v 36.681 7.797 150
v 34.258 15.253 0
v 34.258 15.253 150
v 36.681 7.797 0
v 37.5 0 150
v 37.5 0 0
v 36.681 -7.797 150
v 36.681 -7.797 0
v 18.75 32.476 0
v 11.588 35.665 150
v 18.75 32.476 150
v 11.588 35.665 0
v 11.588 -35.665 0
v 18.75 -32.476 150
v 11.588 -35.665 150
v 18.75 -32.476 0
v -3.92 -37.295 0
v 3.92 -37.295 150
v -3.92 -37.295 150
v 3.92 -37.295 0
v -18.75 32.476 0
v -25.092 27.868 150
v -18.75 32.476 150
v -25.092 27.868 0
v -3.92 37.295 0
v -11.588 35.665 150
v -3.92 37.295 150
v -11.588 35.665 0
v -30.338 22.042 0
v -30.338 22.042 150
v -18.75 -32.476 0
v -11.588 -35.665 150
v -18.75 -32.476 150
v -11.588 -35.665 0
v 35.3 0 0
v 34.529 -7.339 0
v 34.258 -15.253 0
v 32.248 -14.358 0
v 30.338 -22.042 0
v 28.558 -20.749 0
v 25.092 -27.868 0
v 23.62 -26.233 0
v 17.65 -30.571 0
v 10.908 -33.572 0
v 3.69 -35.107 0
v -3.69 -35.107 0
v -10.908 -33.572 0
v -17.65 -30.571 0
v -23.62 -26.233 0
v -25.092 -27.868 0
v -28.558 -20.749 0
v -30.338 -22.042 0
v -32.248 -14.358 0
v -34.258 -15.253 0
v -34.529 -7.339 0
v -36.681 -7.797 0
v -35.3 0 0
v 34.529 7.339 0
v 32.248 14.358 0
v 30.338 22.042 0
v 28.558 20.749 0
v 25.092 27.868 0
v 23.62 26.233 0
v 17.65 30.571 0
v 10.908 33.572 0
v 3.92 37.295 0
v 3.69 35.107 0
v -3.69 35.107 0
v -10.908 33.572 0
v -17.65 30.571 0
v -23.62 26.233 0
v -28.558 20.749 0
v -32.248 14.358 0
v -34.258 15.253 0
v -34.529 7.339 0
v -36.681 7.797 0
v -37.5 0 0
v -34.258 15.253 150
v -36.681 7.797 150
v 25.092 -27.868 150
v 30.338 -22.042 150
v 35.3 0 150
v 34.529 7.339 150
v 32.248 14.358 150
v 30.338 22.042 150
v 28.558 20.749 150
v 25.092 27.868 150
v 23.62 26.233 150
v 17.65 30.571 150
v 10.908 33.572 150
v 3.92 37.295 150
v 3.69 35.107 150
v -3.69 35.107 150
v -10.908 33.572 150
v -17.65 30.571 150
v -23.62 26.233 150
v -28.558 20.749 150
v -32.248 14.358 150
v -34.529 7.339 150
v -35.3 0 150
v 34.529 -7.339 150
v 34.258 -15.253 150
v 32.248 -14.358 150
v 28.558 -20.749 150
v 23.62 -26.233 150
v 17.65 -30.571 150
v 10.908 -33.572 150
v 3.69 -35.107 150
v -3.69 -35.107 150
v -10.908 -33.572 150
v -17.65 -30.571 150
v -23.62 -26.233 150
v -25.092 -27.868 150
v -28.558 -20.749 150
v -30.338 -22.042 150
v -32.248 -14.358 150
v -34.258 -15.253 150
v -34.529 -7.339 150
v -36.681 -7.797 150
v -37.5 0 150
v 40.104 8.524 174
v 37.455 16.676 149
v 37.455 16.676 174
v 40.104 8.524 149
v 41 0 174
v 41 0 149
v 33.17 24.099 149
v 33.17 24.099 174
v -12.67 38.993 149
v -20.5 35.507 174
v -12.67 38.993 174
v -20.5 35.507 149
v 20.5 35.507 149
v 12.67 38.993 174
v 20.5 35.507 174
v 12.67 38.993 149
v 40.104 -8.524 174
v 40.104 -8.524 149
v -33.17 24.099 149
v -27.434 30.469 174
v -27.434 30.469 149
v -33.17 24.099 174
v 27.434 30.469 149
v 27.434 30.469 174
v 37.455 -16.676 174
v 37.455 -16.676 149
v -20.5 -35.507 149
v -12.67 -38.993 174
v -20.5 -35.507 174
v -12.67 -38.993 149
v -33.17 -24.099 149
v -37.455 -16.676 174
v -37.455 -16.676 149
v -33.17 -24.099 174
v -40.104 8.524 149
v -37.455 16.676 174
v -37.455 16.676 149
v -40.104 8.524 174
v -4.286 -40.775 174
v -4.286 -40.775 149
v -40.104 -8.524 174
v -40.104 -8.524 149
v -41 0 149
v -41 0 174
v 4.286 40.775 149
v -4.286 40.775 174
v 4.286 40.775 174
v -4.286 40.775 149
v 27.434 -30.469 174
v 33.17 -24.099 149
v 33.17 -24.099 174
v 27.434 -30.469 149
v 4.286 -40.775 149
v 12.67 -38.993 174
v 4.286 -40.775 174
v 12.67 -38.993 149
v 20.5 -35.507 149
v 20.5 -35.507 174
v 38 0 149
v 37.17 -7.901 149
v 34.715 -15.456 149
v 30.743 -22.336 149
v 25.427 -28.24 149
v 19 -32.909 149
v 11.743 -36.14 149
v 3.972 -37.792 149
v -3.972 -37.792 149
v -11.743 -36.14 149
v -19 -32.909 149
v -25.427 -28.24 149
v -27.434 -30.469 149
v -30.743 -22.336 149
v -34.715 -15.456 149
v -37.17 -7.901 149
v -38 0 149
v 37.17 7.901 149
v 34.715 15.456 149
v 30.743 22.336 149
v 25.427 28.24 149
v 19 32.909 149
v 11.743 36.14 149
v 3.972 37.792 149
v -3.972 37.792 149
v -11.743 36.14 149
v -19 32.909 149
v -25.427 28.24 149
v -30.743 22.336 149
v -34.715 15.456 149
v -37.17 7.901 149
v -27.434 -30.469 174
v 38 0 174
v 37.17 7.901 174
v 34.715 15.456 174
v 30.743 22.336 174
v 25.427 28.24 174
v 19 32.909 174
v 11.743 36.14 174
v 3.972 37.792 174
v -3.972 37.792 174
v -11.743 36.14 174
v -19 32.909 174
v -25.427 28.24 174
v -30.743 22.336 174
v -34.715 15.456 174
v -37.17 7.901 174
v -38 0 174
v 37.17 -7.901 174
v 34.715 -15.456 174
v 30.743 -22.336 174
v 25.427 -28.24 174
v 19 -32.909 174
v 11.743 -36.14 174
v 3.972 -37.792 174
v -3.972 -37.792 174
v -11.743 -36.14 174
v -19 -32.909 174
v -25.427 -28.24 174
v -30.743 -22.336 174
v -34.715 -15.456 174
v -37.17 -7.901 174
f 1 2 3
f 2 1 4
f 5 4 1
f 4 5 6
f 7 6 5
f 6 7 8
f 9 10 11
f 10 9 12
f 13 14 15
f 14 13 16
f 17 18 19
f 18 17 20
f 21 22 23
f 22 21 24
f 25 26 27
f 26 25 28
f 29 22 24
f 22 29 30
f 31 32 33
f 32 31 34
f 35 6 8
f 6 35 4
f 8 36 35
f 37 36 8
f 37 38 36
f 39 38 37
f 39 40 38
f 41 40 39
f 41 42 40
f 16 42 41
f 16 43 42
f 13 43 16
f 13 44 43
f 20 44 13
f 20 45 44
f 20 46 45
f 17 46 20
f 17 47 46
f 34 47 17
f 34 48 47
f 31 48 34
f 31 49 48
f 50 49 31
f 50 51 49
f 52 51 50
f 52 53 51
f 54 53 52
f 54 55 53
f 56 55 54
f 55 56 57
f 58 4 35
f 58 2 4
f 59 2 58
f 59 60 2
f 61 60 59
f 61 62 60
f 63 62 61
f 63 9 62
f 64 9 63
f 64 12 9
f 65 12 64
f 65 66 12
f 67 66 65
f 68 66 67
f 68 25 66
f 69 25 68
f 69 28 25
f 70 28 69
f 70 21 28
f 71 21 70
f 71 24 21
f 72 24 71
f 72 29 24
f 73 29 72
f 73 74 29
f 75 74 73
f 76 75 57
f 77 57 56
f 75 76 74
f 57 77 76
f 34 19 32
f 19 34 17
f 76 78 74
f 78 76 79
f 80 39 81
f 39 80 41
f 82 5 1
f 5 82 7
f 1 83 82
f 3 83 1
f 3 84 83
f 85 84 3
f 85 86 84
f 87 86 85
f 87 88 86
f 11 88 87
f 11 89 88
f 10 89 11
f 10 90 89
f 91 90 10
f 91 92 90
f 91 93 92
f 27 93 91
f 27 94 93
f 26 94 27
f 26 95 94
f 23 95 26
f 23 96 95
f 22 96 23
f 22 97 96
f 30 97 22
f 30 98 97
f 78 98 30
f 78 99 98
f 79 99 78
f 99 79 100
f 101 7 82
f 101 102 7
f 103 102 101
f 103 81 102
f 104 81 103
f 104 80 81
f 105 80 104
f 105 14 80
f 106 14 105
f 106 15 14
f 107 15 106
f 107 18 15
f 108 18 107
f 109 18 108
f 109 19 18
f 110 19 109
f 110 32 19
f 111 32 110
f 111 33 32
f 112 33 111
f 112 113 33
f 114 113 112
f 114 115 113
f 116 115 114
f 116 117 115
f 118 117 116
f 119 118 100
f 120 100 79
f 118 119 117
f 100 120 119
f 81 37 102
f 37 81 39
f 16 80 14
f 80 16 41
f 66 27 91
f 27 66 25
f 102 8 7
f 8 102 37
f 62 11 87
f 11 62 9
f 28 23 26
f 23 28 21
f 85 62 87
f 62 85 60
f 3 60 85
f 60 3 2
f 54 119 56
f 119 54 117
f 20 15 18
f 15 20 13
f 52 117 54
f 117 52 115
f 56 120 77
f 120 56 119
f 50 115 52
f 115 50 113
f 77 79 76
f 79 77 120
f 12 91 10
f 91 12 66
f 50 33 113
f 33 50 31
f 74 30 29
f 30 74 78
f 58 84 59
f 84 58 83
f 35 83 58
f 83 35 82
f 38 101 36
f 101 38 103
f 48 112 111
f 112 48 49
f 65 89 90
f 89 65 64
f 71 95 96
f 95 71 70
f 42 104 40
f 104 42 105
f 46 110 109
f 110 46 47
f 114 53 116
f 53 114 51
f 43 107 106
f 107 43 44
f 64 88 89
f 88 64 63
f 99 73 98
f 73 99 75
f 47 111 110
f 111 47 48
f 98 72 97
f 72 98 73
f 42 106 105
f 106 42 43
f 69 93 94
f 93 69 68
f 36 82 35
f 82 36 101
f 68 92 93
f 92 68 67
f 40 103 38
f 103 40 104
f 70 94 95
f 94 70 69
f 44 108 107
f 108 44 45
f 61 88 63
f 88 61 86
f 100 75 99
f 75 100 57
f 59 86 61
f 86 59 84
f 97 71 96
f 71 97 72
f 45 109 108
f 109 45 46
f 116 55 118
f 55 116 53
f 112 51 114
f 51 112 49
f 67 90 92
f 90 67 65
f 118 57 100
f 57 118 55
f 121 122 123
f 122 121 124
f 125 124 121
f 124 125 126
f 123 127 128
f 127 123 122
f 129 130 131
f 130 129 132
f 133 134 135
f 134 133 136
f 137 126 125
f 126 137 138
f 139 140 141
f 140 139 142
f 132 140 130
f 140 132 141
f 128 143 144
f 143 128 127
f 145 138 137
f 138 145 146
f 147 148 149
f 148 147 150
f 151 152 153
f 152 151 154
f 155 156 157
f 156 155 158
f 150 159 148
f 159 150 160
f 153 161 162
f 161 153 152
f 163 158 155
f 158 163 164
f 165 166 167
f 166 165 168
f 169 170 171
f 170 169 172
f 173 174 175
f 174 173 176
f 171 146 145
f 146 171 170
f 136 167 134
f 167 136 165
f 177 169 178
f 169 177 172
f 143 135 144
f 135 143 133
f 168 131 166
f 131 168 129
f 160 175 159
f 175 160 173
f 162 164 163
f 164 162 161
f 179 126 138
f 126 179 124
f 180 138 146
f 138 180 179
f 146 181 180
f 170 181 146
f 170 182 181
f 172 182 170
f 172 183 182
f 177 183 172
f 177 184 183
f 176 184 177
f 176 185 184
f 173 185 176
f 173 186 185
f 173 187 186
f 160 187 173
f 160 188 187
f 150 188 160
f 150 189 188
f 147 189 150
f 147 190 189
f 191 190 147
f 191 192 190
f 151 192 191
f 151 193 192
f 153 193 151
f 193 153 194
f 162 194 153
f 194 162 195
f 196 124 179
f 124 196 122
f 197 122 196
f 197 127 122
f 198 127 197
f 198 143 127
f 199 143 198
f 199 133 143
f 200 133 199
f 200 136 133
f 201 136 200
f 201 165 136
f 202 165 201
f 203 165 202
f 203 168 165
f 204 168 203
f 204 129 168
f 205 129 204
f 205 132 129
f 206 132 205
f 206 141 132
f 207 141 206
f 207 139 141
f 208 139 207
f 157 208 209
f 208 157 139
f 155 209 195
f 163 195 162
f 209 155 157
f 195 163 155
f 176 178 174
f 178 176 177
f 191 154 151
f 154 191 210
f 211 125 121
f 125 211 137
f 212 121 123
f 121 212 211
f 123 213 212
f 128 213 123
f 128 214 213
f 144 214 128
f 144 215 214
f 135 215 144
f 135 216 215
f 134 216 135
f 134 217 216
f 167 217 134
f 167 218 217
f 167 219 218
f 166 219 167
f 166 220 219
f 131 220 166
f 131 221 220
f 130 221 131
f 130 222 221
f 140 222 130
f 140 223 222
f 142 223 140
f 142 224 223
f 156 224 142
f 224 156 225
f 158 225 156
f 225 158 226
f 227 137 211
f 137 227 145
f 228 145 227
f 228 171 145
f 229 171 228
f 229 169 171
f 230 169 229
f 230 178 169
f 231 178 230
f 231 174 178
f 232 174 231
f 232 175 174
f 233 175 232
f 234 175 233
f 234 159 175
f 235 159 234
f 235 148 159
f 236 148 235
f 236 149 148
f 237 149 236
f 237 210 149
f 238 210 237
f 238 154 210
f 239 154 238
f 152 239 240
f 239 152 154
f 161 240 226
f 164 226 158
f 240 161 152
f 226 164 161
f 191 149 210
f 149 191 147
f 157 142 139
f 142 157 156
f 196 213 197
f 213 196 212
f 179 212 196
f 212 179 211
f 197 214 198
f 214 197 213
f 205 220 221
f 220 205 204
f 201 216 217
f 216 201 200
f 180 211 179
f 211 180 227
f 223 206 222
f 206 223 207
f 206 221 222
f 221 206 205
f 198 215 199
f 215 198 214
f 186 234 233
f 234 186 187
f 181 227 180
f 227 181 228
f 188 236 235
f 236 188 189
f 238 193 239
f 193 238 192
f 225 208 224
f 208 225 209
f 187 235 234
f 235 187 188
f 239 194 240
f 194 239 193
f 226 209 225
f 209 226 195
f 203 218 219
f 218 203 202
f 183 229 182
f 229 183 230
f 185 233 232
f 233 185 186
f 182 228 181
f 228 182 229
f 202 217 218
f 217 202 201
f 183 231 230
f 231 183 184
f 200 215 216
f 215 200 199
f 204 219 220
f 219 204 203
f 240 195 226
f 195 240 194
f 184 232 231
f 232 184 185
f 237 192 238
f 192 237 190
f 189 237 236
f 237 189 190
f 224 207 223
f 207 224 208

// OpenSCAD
// Parameters
length_mm = 150; //[75:300:1]
ht75_outer_diameter = 75; //[60:90:0.5]
ht75_wall_thickness = 2.2; //[1.1:4.4:0.1]
fitting_length = 25; //[12:50:1]
fitting_outer_diameter = 82; //[75:100:0.5]
fitting_wall_thickness = 3; //[1.5:6:0.1]
socket_depth = 18; //[8:35:1]
connection_overlap = 1; //[0.5:2:0.1]
clearance = 0.4; //[0.1:1:0.1]

// Ht Pipe - complete geometry
module ht_pipe() {
  color([0.85, 0.85, 0.8]) {
    // Hollow tube wall
    difference() {
      cylinder(h=length_mm, r=ht75_outer_diameter/2, center=false);
      translate([0, 0, 0])
        cylinder(h=length_mm, r=ht75_outer_diameter/2 - ht75_wall_thickness, center=false);
    }
    
    // End fitting
    translate([0, 0, length_mm - connection_overlap]) {
      difference() {
        // End fitting shell
        difference() {
          cylinder(h=fitting_length, r=fitting_outer_diameter/2, center=false);
          translate([0, 0, 0])
            cylinder(h=fitting_length, r=fitting_outer_diameter/2 - fitting_wall_thickness, center=false);
        }
        // Socket void
        translate([0, 0, fitting_length - socket_depth])
          cylinder(h=socket_depth, r=ht75_outer_diameter/2 + clearance, center=false);
      }
    }
  }
}

// Assembly
module assembly() {
  ht_pipe();
}

assembly();
